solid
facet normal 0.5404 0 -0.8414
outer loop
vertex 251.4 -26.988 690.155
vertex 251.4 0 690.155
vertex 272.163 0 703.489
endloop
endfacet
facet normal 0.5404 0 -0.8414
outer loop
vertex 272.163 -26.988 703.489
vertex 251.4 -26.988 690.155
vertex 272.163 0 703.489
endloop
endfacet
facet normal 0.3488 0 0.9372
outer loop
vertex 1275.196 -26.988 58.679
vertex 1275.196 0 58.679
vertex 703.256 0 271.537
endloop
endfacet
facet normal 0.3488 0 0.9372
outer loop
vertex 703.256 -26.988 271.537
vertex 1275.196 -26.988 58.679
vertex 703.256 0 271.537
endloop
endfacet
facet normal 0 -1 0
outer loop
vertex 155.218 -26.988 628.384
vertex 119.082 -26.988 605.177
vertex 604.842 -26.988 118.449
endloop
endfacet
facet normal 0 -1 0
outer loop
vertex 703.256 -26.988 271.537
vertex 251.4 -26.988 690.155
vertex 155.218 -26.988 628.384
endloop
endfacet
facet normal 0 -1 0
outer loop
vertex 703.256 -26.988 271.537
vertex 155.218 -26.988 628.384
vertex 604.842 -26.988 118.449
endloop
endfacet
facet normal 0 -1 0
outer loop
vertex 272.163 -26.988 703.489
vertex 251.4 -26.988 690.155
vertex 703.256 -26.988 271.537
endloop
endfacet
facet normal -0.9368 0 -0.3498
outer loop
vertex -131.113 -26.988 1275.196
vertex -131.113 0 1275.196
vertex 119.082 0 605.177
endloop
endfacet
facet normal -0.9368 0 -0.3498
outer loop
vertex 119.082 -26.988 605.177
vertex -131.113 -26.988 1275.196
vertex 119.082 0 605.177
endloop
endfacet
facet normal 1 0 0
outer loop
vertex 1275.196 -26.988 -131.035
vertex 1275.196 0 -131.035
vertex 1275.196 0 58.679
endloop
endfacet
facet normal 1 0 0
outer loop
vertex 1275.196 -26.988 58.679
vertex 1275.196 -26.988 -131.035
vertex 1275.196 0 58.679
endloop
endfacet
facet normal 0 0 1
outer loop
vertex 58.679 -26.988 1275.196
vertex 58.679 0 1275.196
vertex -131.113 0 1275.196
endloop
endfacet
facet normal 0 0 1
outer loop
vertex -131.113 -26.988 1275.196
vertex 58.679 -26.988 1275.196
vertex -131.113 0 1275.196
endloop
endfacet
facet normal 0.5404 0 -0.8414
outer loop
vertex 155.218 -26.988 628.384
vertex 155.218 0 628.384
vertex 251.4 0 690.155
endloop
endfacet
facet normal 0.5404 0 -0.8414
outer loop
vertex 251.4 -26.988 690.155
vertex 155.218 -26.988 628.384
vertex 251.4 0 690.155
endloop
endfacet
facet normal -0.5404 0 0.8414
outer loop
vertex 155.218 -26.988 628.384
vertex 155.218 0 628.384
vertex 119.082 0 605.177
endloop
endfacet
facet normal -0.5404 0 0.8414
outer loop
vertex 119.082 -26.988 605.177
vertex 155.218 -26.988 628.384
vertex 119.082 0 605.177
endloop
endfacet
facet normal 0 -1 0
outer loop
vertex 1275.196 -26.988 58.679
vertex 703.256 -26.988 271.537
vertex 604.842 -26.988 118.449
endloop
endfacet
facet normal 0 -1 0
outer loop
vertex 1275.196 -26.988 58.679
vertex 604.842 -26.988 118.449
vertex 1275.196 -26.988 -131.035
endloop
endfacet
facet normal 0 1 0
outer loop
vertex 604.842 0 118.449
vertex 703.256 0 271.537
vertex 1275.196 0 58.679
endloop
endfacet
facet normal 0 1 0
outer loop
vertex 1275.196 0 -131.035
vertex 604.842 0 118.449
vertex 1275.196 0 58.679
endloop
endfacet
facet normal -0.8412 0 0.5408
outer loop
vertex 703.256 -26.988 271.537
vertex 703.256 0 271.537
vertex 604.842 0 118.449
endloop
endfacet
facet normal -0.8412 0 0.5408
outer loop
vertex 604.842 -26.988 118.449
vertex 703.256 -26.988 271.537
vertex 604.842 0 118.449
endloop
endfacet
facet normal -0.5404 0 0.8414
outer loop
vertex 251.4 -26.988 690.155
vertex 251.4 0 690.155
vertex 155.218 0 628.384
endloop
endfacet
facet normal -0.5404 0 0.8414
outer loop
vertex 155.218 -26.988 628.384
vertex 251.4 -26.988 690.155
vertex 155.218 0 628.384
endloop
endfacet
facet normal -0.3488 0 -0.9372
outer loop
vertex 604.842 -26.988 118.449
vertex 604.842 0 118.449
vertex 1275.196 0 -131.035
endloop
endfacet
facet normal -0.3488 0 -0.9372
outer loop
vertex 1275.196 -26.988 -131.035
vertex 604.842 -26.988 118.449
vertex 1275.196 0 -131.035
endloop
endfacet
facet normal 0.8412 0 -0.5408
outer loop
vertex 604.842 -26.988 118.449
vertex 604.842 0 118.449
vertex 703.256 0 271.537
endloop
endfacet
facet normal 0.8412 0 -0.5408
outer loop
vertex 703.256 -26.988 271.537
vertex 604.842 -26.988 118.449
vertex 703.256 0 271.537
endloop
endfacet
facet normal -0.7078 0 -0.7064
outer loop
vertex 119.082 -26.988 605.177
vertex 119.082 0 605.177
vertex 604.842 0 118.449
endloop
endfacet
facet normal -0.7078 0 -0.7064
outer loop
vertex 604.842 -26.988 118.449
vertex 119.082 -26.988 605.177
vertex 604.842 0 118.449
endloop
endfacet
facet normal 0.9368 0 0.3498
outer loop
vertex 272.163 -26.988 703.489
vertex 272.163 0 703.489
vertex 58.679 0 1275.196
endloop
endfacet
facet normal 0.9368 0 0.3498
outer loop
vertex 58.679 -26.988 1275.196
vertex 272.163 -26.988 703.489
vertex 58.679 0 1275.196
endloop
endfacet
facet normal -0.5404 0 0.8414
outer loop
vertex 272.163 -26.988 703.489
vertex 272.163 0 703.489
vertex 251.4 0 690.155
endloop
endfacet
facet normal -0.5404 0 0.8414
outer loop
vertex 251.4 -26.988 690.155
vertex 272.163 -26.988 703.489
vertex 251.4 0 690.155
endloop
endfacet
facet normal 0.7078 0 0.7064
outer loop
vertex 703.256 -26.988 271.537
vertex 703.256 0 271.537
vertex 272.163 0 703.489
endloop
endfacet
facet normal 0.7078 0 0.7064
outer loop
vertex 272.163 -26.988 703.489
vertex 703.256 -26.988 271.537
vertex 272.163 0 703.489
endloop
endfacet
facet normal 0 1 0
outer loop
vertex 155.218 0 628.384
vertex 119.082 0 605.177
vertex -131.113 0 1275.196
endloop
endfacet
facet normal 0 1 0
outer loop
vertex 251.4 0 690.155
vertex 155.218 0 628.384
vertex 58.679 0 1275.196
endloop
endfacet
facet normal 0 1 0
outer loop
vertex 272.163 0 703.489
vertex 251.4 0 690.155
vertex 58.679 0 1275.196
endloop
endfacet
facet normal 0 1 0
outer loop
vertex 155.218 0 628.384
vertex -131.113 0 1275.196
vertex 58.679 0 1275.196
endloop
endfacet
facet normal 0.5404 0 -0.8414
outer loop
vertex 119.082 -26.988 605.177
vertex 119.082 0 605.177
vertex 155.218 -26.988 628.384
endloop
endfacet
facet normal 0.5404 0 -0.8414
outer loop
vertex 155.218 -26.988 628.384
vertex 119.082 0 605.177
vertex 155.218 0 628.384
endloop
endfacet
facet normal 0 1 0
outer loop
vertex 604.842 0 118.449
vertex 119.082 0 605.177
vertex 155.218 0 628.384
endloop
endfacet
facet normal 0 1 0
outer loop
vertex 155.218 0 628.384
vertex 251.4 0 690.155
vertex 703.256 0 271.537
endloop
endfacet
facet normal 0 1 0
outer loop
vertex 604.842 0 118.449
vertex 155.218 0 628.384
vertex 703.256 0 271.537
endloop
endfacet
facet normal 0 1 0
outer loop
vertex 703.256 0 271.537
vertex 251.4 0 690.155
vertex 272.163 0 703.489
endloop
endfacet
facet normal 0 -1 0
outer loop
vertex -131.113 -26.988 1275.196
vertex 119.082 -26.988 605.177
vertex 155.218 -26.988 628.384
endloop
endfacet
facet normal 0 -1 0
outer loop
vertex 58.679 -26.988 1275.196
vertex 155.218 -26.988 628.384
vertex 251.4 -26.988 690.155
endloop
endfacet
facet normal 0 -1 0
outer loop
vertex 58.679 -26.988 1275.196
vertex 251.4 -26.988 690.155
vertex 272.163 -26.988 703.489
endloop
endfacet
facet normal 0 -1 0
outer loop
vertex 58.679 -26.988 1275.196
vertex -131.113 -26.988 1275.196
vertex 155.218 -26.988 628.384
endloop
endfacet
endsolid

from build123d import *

# Parameters (mm, degrees)
F1_DEPTH = 26.9875
F2_DEPTH = 26.9875


with BuildPart() as f1:
    # F0 (on Front) → F1 (new body)
    with BuildSketch(Plane.XZ):
        with BuildLine():
            Line((58.678790709, 1275.1963691918), (51.058790709, 1275.1963691918))
            ThreePointArc((51.058790709, 1275.1963691918), (117.8340490666, 971.2397850446), (251.400154971, 690.1550370971))
            Line((251.400154971, 690.1550370971), (272.1626140884, 703.4892466131))
            Line((272.1626140884, 703.4892466131), (58.678790709, 1275.1963691918))
        make_face()
        with BuildLine():
            Line((51.058790709, 1275.1963691918), (0, 1275.1963691918))
            ThreePointArc((0, 1275.1963691918), (69.0407381145, 956.9284740421), (208.6522133677, 662.7011595724))
            Line((208.6522133677, 662.7011595725), (251.400154971, 690.1550370971))
            ThreePointArc((251.400154971, 690.1550370971), (117.8340490666, 971.2397850446), (51.058790709, 1275.1963691918))
        make_face()
        with BuildLine():
            ThreePointArc((208.6522133677, 662.7011595724), (69.0407381145, 956.9284740421), (0, 1275.1963691918))
            Line((0, 1275.1963691918), (-63.7984330513, 1275.1963691918))
            ThreePointArc((-63.7984330513, 1275.1963691918), (8.0539380569, 939.0396818826), (155.2176541578, 628.3840488741))
            Line((155.2176541578, 628.3840488741), (208.6522133677, 662.7011595725))
        make_face()
        with BuildLine():
            ThreePointArc((155.2176541578, 628.3840488741), (8.0539380569, 939.0396818826), (-63.7984330513, 1275.1963691918))
            Line((-63.7984330513, 1275.1963691918), (-131.1129039445, 1275.1963691918))
            Line((-131.1129039445, 1275.1963691918), (119.0821964714, 605.1768863206))
            Line((119.0821964714, 605.1768863206), (155.2176541578, 628.3840488741))
        make_face()
    extrude(amount=F1_DEPTH)


with BuildPart() as f1b:
    # F0 (on Front) → F1, piece 2 (new body)
    with BuildSketch(Plane.XZ):
        with BuildLine():
            Line((703.2559501702, 271.5368042797), (690.2663237408, 251.3308140456))
            ThreePointArc((690.2663237409, 251.3308140456), (971.3018104773, 117.8128107534), (1275.1963691918, 51.058790709))
            Line((1275.1963691918, 51.058790709), (1275.1963691918, 58.678790709))
            Line((1275.1963691918, 58.678790709), (703.2559501702, 271.5368042797))
        make_face()
        with BuildLine():
            Line((690.2663237408, 251.3308140456), (662.793087873, 208.5948709711))
            ThreePointArc((662.793087873, 208.5948709711), (956.9797538154, 69.0232702705), (1275.1963691918, 0))
            Line((1275.1963691918, 0), (1275.1963691918, 51.058790709))
            ThreePointArc((1275.1963691918, 51.058790709), (971.3018104773, 117.8128107534), (690.2663237409, 251.3308140456))
        make_face()
        with BuildLine():
            ThreePointArc((1275.1963691918, 0), (956.9797538154, 69.0232702705), (662.793087873, 208.5948709711))
            Line((662.793087873, 208.5948709711), (628.4517986621, 155.1753397633))
            ThreePointArc((628.4517986621, 155.1753397633), (939.0775113648, 8.0411292429), (1275.1963691918, -63.7984330513))
            Line((1275.1963691918, -63.7984330513), (1275.1963691918, 0))
        make_face()
        with BuildLine():
            ThreePointArc((1275.1963691918, -63.7984330513), (939.0775113648, 8.0411292429), (628.4517986621, 155.1753397633))
            Line((628.4517986621, 155.1753397633), (604.8419510012, 118.4490833264))
            Line((604.8419510012, 118.4490833264), (1275.1963691918, -131.0354872665))
            Line((1275.1963691918, -131.0354872665), (1275.1963691918, -63.7984330513))
        make_face()
    extrude(amount=F1_DEPTH)


with BuildPart() as f2:
    # F0 (on Front) → F2 (new body)
    with BuildSketch(Plane.XZ):
        with BuildLine():
            Line((272.1626140884, 703.4892466131), (251.400154971, 690.1550370971))
            ThreePointArc((251.400154971, 690.1550370971), (445.6915696116, 445.5988526201), (690.2663237409, 251.3308140456))
            Line((690.2663237408, 251.3308140456), (703.2559501702, 271.5368042797))
            Line((703.2559501702, 271.5368042797), (272.1626140884, 703.4892466131))
        make_face()
        with BuildLine():
            Line((251.400154971, 690.1550370971), (208.6522133677, 662.7011595725))
            ThreePointArc((208.6522133677, 662.7011595724), (409.7624925237, 409.6858799826), (662.793087873, 208.5948709711))
            Line((662.793087873, 208.5948709711), (690.2663237408, 251.3308140456))
            ThreePointArc((690.2663237409, 251.3308140456), (445.6915696116, 445.5988526201), (251.400154971, 690.1550370971))
        make_face()
        with BuildLine():
            ThreePointArc((662.793087873, 208.5948709711), (409.7624925237, 409.6858799826), (208.6522133677, 662.7011595724))
            Line((208.6522133677, 662.7011595725), (155.2176541578, 628.3840488741))
            ThreePointArc((155.2176541578, 628.3840488741), (364.8511465394, 364.7946640565), (628.4517986621, 155.1753397633))
            Line((628.4517986621, 155.1753397633), (662.793087873, 208.5948709711))
        make_face()
        with BuildLine():
            ThreePointArc((628.4517986621, 155.1753397633), (364.8511465394, 364.7946640565), (155.2176541578, 628.3840488741))
            Line((155.2176541578, 628.3840488741), (119.0821964714, 605.1768863206))
            Line((119.0821964714, 605.1768863206), (604.8419510012, 118.4490833264))
            Line((604.8419510012, 118.4490833264), (628.4517986621, 155.1753397633))
        make_face()
    extrude(amount=F2_DEPTH)


solid = Compound([f1.part, f1b.part, f2.part])
